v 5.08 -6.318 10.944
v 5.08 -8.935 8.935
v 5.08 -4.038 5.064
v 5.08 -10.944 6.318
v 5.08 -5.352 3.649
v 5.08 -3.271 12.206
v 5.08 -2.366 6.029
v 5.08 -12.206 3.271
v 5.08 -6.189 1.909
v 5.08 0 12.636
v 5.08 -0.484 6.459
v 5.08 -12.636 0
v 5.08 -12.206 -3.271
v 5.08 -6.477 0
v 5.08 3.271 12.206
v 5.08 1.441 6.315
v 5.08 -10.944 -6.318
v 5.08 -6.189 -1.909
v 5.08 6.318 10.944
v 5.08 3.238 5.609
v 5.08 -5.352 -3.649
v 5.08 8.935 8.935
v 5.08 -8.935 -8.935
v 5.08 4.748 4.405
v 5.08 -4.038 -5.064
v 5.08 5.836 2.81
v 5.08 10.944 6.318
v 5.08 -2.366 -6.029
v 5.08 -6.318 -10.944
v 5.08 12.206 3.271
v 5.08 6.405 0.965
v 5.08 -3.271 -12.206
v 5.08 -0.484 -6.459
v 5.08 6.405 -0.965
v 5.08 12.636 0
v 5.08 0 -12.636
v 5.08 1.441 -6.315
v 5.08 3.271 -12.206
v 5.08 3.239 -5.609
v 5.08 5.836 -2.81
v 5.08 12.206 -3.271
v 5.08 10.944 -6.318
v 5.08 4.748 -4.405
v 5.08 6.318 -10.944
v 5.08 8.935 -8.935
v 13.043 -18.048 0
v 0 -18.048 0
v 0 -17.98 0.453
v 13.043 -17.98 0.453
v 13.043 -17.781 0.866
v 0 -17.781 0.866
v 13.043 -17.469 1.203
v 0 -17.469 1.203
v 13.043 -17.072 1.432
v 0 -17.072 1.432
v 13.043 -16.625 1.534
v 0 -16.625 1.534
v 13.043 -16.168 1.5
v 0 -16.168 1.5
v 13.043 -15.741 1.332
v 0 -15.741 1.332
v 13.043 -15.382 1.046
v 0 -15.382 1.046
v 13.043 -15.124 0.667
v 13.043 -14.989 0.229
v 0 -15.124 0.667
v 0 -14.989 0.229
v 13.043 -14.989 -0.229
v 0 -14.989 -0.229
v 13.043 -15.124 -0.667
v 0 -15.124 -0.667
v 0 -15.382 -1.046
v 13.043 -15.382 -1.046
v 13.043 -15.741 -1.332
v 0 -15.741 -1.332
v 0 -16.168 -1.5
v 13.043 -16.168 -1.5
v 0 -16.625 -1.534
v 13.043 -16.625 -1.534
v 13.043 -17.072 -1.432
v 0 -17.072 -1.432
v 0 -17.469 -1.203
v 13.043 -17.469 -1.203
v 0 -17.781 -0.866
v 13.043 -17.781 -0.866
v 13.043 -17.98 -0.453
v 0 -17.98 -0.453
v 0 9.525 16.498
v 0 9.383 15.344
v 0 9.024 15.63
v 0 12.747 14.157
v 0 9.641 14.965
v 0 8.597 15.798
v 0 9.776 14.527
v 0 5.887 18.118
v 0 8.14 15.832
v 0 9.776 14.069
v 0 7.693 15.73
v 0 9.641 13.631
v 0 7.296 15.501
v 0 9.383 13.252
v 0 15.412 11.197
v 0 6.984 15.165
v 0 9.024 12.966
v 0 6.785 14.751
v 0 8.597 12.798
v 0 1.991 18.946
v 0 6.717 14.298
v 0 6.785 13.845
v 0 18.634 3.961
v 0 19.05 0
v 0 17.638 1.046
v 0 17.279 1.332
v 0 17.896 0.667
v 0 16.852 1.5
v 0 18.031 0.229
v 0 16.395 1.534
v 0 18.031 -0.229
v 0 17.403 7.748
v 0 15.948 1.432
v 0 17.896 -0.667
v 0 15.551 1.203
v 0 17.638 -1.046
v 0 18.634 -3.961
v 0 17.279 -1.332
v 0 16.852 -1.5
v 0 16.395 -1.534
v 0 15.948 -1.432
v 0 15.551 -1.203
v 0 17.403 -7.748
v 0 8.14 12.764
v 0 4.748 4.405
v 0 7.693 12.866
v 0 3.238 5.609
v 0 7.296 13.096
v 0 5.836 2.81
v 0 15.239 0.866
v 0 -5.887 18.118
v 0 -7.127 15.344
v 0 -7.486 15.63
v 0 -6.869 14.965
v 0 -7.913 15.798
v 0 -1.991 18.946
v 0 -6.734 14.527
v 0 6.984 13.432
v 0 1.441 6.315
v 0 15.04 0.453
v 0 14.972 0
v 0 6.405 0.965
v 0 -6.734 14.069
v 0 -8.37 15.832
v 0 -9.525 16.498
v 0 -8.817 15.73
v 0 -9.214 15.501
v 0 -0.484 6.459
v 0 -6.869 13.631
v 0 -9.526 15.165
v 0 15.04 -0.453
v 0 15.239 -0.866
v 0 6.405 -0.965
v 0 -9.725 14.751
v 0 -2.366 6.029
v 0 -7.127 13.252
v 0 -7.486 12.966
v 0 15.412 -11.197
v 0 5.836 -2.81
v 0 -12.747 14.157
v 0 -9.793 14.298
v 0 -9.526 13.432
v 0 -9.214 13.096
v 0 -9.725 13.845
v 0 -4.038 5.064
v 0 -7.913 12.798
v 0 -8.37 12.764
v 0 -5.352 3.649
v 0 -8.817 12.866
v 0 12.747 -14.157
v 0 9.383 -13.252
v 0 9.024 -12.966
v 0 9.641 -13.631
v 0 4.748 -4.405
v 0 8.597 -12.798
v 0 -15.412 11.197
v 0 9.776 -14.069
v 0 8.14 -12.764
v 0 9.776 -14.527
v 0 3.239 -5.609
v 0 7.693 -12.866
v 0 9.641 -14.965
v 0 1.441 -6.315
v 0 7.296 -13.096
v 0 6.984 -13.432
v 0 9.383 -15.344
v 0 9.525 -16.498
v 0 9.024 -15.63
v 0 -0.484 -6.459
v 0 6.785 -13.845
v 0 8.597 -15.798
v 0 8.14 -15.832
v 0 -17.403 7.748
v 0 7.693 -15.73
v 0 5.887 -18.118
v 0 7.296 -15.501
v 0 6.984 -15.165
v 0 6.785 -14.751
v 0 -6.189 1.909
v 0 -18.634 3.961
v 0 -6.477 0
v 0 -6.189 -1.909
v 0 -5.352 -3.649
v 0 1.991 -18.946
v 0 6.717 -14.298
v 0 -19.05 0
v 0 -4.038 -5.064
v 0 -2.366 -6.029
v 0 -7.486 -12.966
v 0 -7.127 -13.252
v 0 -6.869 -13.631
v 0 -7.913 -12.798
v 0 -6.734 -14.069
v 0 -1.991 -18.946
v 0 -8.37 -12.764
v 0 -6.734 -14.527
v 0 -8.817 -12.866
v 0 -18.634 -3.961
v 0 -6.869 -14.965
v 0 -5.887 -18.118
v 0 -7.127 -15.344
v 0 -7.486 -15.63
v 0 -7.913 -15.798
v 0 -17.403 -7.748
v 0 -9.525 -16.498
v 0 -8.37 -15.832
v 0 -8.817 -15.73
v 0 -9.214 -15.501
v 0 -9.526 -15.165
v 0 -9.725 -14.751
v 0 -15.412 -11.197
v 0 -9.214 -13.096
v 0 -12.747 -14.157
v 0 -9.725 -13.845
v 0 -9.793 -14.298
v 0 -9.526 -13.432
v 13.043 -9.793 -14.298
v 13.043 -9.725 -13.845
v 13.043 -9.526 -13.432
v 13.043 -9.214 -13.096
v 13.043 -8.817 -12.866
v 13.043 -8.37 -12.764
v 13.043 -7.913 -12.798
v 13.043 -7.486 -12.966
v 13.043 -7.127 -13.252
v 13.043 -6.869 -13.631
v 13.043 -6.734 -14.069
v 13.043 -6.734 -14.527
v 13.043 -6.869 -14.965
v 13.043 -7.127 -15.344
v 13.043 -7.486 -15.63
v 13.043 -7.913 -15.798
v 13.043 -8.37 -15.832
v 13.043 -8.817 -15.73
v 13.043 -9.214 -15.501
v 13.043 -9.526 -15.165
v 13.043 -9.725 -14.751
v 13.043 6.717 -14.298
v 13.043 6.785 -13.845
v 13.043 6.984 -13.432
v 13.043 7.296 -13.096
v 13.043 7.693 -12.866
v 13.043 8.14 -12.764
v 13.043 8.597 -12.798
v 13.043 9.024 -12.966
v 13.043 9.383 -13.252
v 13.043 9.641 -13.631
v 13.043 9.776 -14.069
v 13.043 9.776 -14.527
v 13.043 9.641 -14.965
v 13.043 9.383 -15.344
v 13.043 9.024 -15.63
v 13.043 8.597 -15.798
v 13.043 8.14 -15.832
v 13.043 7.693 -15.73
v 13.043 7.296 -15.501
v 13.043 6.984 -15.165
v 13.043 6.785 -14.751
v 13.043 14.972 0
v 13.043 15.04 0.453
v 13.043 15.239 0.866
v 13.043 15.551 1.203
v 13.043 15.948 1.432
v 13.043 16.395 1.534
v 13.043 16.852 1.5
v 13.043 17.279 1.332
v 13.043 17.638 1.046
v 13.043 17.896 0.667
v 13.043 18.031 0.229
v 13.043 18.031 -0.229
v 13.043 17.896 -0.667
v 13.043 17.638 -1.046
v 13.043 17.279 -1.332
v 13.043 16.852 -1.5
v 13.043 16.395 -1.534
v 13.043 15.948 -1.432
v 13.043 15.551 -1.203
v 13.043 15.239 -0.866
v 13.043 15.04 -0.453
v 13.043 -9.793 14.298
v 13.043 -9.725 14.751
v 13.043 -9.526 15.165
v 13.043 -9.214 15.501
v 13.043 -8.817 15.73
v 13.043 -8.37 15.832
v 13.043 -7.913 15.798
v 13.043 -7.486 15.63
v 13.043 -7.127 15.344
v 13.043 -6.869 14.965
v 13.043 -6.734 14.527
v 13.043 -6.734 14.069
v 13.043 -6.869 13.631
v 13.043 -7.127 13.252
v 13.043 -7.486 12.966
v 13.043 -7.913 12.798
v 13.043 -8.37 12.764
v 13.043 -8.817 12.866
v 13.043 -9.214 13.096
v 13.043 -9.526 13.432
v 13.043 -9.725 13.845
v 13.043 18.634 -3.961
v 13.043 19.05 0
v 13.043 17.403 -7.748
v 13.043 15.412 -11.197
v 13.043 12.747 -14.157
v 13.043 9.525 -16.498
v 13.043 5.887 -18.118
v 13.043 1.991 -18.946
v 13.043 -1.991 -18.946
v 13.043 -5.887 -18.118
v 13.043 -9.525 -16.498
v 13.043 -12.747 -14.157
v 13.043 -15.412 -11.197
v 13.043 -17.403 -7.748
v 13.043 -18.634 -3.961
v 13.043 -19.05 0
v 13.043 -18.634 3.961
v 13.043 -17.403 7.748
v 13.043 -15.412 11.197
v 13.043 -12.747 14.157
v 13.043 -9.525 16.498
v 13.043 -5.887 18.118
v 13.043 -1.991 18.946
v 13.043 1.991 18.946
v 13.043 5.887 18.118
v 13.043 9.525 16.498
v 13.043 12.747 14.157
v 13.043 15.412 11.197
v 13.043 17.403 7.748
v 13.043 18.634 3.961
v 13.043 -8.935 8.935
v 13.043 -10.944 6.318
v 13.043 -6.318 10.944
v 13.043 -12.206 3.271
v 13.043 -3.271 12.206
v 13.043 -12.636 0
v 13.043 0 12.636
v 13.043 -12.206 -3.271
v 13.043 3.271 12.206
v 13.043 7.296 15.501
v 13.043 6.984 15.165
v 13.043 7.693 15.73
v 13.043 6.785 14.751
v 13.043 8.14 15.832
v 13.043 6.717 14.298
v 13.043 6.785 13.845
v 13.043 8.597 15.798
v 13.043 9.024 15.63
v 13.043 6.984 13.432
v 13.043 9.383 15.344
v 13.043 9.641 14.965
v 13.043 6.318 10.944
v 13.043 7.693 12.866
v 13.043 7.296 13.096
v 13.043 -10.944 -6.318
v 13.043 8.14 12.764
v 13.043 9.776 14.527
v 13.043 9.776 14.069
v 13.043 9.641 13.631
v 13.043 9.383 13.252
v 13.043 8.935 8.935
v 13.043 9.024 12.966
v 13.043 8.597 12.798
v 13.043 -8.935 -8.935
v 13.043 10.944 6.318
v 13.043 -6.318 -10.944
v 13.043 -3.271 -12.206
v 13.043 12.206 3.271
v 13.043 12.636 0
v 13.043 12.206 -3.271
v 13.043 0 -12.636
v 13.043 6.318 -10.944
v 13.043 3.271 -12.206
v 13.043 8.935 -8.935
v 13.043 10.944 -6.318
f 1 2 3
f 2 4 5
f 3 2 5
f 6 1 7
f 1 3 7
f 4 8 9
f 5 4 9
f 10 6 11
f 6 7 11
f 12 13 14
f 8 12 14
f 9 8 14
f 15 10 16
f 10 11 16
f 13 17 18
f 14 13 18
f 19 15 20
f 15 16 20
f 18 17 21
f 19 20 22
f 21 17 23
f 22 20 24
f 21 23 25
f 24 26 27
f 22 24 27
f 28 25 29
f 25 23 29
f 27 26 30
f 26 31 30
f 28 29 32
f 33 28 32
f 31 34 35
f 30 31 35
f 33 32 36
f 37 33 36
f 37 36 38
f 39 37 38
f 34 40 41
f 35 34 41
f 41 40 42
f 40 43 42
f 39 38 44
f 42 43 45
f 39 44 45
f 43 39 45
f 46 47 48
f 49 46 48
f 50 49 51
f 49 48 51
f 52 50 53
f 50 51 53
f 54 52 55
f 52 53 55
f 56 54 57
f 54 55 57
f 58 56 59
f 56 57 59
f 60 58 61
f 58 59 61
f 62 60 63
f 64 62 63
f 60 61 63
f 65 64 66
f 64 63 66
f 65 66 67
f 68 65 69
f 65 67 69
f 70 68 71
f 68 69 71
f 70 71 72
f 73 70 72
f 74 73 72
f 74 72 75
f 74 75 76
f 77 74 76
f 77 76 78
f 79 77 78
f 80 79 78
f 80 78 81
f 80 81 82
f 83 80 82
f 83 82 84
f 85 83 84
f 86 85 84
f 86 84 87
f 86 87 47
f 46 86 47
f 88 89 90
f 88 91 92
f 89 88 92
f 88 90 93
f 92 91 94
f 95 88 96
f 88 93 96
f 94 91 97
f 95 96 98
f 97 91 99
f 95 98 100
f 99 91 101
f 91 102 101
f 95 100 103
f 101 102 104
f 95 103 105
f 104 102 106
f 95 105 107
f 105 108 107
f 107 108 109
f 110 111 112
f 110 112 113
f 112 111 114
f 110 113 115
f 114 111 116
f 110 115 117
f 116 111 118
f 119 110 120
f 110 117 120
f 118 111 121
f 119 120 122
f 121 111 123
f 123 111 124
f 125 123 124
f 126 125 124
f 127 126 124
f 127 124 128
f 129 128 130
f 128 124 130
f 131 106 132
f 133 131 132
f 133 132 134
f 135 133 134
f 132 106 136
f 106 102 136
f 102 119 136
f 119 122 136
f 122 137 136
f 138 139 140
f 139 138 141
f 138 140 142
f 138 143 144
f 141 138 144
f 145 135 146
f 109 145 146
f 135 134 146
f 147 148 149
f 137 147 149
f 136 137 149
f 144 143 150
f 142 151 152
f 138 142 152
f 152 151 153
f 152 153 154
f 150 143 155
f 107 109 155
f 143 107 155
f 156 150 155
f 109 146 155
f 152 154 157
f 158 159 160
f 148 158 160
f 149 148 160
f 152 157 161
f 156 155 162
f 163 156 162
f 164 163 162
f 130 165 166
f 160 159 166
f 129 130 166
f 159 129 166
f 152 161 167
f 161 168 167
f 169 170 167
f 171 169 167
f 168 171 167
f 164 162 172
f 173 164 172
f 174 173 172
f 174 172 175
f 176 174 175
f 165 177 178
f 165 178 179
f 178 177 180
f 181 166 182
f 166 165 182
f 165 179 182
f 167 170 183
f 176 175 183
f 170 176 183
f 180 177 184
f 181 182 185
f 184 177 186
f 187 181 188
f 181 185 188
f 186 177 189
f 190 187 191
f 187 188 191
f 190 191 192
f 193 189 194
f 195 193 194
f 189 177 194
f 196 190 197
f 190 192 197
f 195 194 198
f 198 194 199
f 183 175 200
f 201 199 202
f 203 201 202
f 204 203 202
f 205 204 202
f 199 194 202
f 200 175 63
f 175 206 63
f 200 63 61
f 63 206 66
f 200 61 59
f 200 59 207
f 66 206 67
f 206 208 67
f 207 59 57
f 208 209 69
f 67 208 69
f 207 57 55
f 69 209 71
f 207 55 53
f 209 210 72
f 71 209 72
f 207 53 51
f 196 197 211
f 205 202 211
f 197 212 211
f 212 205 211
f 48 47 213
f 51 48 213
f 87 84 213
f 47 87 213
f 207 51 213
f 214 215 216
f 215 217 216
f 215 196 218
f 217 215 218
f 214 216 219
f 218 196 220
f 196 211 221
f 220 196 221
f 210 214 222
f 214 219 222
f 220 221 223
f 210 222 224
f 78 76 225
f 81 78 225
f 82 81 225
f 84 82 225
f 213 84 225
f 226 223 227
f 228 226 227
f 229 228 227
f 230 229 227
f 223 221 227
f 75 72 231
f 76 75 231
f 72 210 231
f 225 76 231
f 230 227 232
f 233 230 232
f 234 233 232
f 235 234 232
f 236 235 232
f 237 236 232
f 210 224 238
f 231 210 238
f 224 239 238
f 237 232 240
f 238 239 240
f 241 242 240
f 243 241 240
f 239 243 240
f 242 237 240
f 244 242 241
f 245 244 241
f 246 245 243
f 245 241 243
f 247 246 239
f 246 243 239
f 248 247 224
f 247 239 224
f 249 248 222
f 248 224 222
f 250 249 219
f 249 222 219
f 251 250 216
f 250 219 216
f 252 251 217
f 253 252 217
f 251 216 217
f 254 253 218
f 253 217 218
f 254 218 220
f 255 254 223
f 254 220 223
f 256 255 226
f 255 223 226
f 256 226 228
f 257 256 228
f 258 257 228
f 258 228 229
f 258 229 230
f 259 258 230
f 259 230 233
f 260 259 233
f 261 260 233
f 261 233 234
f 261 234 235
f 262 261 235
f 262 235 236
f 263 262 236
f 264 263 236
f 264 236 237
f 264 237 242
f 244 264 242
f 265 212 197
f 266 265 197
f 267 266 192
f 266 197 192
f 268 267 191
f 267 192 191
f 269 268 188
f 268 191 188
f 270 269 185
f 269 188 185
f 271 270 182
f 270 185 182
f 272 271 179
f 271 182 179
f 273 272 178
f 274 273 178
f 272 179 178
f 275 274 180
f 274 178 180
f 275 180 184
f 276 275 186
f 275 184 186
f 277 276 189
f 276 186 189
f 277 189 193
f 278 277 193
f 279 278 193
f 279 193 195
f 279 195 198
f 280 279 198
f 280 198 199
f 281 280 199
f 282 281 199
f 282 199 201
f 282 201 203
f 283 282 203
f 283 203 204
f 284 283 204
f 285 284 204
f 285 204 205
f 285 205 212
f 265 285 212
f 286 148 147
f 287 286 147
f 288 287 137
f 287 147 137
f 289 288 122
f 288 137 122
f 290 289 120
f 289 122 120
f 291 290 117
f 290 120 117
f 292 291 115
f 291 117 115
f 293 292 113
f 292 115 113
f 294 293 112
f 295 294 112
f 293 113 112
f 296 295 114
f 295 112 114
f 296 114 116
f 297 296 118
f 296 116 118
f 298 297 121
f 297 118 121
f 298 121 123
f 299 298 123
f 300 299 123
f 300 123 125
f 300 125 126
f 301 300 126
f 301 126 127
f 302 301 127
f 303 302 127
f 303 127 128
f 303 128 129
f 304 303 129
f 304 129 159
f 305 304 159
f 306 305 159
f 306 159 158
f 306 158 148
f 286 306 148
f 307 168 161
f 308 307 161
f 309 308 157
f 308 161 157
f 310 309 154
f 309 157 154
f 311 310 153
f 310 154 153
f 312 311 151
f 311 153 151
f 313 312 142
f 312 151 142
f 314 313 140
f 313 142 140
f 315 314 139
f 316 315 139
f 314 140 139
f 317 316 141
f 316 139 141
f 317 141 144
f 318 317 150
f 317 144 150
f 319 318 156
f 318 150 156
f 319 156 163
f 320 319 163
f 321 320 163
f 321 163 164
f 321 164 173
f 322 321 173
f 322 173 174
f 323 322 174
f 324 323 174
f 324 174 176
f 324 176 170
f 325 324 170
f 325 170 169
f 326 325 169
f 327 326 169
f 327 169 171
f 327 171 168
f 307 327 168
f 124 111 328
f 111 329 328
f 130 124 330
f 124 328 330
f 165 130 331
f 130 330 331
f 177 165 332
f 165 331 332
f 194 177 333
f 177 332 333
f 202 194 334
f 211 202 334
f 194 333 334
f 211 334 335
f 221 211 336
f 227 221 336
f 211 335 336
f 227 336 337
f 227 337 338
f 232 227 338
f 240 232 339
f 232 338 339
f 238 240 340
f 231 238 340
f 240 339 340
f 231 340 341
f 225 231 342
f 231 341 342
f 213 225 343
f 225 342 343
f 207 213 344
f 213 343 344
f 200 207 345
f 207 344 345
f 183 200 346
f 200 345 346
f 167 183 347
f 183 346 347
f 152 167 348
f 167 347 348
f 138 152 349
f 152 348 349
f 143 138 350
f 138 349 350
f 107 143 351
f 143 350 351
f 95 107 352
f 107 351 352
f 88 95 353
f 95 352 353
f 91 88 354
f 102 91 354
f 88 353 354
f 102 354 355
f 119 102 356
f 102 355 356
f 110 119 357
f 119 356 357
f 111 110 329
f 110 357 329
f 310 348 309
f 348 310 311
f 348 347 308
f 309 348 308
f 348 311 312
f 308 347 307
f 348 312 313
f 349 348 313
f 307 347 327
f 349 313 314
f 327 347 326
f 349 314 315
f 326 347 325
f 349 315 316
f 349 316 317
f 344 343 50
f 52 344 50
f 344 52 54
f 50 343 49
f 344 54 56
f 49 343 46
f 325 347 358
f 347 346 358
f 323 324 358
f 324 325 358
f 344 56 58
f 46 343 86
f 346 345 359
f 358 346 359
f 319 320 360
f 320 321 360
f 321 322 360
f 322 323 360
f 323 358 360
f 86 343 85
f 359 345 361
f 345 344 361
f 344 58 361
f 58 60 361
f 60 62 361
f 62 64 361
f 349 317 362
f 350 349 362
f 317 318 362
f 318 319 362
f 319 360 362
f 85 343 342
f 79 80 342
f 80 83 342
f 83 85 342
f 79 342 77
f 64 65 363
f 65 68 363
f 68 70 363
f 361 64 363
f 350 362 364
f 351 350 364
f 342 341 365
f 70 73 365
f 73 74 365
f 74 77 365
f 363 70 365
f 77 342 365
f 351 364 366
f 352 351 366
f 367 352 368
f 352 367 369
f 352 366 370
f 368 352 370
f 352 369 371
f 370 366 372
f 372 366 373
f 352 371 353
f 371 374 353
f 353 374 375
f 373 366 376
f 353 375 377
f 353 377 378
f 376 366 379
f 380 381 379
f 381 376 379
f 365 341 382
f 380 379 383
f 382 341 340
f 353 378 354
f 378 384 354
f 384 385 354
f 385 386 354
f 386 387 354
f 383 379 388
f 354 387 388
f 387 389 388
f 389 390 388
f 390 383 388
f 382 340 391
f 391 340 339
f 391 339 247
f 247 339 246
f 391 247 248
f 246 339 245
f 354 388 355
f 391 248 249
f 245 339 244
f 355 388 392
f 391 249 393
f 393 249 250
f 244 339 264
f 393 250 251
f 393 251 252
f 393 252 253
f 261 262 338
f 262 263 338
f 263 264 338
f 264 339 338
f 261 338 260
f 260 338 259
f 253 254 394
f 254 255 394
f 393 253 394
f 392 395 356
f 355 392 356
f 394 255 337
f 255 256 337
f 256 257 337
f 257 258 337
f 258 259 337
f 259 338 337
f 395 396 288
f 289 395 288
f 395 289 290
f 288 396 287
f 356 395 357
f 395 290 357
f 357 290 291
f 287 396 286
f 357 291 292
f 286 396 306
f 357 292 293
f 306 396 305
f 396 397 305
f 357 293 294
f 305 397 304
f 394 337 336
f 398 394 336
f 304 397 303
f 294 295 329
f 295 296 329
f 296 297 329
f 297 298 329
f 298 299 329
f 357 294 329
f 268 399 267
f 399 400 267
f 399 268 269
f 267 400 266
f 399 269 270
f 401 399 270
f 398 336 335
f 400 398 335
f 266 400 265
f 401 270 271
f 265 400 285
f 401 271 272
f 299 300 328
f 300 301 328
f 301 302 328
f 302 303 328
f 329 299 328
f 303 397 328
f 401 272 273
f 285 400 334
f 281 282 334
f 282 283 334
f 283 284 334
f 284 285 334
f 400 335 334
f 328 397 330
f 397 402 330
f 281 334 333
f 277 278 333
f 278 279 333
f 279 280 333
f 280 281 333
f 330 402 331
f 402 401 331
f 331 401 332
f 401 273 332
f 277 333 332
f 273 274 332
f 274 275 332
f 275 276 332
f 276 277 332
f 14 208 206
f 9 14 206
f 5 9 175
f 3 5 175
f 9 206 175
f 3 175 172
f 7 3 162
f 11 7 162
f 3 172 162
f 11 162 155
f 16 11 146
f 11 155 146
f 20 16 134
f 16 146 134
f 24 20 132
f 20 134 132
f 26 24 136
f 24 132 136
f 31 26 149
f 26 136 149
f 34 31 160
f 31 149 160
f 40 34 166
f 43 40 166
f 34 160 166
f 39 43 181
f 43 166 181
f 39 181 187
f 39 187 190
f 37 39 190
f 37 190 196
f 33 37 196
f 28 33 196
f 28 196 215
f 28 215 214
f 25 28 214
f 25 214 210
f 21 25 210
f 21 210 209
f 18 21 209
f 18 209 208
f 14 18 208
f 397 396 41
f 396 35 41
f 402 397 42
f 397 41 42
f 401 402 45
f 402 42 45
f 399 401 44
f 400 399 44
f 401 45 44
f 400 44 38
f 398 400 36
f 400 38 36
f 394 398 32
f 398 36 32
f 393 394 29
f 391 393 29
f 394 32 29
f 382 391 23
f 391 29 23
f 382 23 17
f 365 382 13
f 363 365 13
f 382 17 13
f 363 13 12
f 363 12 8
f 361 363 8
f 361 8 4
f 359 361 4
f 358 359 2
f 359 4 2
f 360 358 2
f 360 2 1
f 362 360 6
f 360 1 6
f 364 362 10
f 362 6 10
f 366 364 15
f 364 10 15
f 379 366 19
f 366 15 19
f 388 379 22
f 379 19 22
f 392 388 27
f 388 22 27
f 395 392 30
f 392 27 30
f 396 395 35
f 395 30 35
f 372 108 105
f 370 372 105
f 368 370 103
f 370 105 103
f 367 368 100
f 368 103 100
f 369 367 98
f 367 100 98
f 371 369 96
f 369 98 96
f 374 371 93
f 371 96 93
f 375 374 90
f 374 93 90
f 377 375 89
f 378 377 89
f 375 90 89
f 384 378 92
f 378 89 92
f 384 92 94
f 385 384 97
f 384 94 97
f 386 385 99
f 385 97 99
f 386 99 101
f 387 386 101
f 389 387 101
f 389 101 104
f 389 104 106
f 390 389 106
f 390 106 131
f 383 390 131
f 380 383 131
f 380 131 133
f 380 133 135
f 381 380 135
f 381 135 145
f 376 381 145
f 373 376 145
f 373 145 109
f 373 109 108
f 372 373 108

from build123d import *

# Parameters (mm, degrees)
SKETCH2_R          = 6.477
CUT_EXTRUDE1_DEPTH = 30.931960183
SKETCH3_R          = 1.538145308
CUT_EXTRUDE2_DEPTH = 30.931960183


with BuildPart() as part:
    # Sketch1 → Revolve1 (revolve)
    with BuildSketch(Plane.XY):
        Polygon((0, 0), (0, 19.05), (13.0429, 19.05), (13.0429, 12.6365), (5.08, 12.6365), (5.08, 0), align=None)
    revolve(axis=Axis((5.08, 0, 0), (-1, 0, 0)))

    # Sketch2 → Cut-Extrude1 (cut, through all)
    with BuildSketch(Plane.ZY):
        with Locations(Location((0, 0, 0), (0, 0, 270))):
            Circle(SKETCH2_R)
    extrude(amount=-CUT_EXTRUDE1_DEPTH, mode=Mode.SUBTRACT)

    # Sketch3 → Cut-Extrude2 (cut, through all)
    with BuildSketch(Plane.ZY):
        with Locations(Location((0, 16.51, 0), (0, 0, 270))):
            Circle(SKETCH3_R)
        with Locations(Location((14.298079416, 8.255, 0), (0, 0, 270))):
            Circle(SKETCH3_R)
        with Locations(Location((14.298079416, -8.255, 0), (0, 0, 270))):
            Circle(SKETCH3_R)
        with Locations(Location((0, -16.51, 0), (0, 0, 270))):
            Circle(SKETCH3_R)
        with Locations(Location((-14.298079416, -8.255, 0), (0, 0, 270))):
            Circle(SKETCH3_R)
        with Locations(Location((-14.298079416, 8.255, 0), (0, 0, 270))):
            Circle(SKETCH3_R)
    extrude(amount=-CUT_EXTRUDE2_DEPTH, mode=Mode.SUBTRACT)


solid = part.part
